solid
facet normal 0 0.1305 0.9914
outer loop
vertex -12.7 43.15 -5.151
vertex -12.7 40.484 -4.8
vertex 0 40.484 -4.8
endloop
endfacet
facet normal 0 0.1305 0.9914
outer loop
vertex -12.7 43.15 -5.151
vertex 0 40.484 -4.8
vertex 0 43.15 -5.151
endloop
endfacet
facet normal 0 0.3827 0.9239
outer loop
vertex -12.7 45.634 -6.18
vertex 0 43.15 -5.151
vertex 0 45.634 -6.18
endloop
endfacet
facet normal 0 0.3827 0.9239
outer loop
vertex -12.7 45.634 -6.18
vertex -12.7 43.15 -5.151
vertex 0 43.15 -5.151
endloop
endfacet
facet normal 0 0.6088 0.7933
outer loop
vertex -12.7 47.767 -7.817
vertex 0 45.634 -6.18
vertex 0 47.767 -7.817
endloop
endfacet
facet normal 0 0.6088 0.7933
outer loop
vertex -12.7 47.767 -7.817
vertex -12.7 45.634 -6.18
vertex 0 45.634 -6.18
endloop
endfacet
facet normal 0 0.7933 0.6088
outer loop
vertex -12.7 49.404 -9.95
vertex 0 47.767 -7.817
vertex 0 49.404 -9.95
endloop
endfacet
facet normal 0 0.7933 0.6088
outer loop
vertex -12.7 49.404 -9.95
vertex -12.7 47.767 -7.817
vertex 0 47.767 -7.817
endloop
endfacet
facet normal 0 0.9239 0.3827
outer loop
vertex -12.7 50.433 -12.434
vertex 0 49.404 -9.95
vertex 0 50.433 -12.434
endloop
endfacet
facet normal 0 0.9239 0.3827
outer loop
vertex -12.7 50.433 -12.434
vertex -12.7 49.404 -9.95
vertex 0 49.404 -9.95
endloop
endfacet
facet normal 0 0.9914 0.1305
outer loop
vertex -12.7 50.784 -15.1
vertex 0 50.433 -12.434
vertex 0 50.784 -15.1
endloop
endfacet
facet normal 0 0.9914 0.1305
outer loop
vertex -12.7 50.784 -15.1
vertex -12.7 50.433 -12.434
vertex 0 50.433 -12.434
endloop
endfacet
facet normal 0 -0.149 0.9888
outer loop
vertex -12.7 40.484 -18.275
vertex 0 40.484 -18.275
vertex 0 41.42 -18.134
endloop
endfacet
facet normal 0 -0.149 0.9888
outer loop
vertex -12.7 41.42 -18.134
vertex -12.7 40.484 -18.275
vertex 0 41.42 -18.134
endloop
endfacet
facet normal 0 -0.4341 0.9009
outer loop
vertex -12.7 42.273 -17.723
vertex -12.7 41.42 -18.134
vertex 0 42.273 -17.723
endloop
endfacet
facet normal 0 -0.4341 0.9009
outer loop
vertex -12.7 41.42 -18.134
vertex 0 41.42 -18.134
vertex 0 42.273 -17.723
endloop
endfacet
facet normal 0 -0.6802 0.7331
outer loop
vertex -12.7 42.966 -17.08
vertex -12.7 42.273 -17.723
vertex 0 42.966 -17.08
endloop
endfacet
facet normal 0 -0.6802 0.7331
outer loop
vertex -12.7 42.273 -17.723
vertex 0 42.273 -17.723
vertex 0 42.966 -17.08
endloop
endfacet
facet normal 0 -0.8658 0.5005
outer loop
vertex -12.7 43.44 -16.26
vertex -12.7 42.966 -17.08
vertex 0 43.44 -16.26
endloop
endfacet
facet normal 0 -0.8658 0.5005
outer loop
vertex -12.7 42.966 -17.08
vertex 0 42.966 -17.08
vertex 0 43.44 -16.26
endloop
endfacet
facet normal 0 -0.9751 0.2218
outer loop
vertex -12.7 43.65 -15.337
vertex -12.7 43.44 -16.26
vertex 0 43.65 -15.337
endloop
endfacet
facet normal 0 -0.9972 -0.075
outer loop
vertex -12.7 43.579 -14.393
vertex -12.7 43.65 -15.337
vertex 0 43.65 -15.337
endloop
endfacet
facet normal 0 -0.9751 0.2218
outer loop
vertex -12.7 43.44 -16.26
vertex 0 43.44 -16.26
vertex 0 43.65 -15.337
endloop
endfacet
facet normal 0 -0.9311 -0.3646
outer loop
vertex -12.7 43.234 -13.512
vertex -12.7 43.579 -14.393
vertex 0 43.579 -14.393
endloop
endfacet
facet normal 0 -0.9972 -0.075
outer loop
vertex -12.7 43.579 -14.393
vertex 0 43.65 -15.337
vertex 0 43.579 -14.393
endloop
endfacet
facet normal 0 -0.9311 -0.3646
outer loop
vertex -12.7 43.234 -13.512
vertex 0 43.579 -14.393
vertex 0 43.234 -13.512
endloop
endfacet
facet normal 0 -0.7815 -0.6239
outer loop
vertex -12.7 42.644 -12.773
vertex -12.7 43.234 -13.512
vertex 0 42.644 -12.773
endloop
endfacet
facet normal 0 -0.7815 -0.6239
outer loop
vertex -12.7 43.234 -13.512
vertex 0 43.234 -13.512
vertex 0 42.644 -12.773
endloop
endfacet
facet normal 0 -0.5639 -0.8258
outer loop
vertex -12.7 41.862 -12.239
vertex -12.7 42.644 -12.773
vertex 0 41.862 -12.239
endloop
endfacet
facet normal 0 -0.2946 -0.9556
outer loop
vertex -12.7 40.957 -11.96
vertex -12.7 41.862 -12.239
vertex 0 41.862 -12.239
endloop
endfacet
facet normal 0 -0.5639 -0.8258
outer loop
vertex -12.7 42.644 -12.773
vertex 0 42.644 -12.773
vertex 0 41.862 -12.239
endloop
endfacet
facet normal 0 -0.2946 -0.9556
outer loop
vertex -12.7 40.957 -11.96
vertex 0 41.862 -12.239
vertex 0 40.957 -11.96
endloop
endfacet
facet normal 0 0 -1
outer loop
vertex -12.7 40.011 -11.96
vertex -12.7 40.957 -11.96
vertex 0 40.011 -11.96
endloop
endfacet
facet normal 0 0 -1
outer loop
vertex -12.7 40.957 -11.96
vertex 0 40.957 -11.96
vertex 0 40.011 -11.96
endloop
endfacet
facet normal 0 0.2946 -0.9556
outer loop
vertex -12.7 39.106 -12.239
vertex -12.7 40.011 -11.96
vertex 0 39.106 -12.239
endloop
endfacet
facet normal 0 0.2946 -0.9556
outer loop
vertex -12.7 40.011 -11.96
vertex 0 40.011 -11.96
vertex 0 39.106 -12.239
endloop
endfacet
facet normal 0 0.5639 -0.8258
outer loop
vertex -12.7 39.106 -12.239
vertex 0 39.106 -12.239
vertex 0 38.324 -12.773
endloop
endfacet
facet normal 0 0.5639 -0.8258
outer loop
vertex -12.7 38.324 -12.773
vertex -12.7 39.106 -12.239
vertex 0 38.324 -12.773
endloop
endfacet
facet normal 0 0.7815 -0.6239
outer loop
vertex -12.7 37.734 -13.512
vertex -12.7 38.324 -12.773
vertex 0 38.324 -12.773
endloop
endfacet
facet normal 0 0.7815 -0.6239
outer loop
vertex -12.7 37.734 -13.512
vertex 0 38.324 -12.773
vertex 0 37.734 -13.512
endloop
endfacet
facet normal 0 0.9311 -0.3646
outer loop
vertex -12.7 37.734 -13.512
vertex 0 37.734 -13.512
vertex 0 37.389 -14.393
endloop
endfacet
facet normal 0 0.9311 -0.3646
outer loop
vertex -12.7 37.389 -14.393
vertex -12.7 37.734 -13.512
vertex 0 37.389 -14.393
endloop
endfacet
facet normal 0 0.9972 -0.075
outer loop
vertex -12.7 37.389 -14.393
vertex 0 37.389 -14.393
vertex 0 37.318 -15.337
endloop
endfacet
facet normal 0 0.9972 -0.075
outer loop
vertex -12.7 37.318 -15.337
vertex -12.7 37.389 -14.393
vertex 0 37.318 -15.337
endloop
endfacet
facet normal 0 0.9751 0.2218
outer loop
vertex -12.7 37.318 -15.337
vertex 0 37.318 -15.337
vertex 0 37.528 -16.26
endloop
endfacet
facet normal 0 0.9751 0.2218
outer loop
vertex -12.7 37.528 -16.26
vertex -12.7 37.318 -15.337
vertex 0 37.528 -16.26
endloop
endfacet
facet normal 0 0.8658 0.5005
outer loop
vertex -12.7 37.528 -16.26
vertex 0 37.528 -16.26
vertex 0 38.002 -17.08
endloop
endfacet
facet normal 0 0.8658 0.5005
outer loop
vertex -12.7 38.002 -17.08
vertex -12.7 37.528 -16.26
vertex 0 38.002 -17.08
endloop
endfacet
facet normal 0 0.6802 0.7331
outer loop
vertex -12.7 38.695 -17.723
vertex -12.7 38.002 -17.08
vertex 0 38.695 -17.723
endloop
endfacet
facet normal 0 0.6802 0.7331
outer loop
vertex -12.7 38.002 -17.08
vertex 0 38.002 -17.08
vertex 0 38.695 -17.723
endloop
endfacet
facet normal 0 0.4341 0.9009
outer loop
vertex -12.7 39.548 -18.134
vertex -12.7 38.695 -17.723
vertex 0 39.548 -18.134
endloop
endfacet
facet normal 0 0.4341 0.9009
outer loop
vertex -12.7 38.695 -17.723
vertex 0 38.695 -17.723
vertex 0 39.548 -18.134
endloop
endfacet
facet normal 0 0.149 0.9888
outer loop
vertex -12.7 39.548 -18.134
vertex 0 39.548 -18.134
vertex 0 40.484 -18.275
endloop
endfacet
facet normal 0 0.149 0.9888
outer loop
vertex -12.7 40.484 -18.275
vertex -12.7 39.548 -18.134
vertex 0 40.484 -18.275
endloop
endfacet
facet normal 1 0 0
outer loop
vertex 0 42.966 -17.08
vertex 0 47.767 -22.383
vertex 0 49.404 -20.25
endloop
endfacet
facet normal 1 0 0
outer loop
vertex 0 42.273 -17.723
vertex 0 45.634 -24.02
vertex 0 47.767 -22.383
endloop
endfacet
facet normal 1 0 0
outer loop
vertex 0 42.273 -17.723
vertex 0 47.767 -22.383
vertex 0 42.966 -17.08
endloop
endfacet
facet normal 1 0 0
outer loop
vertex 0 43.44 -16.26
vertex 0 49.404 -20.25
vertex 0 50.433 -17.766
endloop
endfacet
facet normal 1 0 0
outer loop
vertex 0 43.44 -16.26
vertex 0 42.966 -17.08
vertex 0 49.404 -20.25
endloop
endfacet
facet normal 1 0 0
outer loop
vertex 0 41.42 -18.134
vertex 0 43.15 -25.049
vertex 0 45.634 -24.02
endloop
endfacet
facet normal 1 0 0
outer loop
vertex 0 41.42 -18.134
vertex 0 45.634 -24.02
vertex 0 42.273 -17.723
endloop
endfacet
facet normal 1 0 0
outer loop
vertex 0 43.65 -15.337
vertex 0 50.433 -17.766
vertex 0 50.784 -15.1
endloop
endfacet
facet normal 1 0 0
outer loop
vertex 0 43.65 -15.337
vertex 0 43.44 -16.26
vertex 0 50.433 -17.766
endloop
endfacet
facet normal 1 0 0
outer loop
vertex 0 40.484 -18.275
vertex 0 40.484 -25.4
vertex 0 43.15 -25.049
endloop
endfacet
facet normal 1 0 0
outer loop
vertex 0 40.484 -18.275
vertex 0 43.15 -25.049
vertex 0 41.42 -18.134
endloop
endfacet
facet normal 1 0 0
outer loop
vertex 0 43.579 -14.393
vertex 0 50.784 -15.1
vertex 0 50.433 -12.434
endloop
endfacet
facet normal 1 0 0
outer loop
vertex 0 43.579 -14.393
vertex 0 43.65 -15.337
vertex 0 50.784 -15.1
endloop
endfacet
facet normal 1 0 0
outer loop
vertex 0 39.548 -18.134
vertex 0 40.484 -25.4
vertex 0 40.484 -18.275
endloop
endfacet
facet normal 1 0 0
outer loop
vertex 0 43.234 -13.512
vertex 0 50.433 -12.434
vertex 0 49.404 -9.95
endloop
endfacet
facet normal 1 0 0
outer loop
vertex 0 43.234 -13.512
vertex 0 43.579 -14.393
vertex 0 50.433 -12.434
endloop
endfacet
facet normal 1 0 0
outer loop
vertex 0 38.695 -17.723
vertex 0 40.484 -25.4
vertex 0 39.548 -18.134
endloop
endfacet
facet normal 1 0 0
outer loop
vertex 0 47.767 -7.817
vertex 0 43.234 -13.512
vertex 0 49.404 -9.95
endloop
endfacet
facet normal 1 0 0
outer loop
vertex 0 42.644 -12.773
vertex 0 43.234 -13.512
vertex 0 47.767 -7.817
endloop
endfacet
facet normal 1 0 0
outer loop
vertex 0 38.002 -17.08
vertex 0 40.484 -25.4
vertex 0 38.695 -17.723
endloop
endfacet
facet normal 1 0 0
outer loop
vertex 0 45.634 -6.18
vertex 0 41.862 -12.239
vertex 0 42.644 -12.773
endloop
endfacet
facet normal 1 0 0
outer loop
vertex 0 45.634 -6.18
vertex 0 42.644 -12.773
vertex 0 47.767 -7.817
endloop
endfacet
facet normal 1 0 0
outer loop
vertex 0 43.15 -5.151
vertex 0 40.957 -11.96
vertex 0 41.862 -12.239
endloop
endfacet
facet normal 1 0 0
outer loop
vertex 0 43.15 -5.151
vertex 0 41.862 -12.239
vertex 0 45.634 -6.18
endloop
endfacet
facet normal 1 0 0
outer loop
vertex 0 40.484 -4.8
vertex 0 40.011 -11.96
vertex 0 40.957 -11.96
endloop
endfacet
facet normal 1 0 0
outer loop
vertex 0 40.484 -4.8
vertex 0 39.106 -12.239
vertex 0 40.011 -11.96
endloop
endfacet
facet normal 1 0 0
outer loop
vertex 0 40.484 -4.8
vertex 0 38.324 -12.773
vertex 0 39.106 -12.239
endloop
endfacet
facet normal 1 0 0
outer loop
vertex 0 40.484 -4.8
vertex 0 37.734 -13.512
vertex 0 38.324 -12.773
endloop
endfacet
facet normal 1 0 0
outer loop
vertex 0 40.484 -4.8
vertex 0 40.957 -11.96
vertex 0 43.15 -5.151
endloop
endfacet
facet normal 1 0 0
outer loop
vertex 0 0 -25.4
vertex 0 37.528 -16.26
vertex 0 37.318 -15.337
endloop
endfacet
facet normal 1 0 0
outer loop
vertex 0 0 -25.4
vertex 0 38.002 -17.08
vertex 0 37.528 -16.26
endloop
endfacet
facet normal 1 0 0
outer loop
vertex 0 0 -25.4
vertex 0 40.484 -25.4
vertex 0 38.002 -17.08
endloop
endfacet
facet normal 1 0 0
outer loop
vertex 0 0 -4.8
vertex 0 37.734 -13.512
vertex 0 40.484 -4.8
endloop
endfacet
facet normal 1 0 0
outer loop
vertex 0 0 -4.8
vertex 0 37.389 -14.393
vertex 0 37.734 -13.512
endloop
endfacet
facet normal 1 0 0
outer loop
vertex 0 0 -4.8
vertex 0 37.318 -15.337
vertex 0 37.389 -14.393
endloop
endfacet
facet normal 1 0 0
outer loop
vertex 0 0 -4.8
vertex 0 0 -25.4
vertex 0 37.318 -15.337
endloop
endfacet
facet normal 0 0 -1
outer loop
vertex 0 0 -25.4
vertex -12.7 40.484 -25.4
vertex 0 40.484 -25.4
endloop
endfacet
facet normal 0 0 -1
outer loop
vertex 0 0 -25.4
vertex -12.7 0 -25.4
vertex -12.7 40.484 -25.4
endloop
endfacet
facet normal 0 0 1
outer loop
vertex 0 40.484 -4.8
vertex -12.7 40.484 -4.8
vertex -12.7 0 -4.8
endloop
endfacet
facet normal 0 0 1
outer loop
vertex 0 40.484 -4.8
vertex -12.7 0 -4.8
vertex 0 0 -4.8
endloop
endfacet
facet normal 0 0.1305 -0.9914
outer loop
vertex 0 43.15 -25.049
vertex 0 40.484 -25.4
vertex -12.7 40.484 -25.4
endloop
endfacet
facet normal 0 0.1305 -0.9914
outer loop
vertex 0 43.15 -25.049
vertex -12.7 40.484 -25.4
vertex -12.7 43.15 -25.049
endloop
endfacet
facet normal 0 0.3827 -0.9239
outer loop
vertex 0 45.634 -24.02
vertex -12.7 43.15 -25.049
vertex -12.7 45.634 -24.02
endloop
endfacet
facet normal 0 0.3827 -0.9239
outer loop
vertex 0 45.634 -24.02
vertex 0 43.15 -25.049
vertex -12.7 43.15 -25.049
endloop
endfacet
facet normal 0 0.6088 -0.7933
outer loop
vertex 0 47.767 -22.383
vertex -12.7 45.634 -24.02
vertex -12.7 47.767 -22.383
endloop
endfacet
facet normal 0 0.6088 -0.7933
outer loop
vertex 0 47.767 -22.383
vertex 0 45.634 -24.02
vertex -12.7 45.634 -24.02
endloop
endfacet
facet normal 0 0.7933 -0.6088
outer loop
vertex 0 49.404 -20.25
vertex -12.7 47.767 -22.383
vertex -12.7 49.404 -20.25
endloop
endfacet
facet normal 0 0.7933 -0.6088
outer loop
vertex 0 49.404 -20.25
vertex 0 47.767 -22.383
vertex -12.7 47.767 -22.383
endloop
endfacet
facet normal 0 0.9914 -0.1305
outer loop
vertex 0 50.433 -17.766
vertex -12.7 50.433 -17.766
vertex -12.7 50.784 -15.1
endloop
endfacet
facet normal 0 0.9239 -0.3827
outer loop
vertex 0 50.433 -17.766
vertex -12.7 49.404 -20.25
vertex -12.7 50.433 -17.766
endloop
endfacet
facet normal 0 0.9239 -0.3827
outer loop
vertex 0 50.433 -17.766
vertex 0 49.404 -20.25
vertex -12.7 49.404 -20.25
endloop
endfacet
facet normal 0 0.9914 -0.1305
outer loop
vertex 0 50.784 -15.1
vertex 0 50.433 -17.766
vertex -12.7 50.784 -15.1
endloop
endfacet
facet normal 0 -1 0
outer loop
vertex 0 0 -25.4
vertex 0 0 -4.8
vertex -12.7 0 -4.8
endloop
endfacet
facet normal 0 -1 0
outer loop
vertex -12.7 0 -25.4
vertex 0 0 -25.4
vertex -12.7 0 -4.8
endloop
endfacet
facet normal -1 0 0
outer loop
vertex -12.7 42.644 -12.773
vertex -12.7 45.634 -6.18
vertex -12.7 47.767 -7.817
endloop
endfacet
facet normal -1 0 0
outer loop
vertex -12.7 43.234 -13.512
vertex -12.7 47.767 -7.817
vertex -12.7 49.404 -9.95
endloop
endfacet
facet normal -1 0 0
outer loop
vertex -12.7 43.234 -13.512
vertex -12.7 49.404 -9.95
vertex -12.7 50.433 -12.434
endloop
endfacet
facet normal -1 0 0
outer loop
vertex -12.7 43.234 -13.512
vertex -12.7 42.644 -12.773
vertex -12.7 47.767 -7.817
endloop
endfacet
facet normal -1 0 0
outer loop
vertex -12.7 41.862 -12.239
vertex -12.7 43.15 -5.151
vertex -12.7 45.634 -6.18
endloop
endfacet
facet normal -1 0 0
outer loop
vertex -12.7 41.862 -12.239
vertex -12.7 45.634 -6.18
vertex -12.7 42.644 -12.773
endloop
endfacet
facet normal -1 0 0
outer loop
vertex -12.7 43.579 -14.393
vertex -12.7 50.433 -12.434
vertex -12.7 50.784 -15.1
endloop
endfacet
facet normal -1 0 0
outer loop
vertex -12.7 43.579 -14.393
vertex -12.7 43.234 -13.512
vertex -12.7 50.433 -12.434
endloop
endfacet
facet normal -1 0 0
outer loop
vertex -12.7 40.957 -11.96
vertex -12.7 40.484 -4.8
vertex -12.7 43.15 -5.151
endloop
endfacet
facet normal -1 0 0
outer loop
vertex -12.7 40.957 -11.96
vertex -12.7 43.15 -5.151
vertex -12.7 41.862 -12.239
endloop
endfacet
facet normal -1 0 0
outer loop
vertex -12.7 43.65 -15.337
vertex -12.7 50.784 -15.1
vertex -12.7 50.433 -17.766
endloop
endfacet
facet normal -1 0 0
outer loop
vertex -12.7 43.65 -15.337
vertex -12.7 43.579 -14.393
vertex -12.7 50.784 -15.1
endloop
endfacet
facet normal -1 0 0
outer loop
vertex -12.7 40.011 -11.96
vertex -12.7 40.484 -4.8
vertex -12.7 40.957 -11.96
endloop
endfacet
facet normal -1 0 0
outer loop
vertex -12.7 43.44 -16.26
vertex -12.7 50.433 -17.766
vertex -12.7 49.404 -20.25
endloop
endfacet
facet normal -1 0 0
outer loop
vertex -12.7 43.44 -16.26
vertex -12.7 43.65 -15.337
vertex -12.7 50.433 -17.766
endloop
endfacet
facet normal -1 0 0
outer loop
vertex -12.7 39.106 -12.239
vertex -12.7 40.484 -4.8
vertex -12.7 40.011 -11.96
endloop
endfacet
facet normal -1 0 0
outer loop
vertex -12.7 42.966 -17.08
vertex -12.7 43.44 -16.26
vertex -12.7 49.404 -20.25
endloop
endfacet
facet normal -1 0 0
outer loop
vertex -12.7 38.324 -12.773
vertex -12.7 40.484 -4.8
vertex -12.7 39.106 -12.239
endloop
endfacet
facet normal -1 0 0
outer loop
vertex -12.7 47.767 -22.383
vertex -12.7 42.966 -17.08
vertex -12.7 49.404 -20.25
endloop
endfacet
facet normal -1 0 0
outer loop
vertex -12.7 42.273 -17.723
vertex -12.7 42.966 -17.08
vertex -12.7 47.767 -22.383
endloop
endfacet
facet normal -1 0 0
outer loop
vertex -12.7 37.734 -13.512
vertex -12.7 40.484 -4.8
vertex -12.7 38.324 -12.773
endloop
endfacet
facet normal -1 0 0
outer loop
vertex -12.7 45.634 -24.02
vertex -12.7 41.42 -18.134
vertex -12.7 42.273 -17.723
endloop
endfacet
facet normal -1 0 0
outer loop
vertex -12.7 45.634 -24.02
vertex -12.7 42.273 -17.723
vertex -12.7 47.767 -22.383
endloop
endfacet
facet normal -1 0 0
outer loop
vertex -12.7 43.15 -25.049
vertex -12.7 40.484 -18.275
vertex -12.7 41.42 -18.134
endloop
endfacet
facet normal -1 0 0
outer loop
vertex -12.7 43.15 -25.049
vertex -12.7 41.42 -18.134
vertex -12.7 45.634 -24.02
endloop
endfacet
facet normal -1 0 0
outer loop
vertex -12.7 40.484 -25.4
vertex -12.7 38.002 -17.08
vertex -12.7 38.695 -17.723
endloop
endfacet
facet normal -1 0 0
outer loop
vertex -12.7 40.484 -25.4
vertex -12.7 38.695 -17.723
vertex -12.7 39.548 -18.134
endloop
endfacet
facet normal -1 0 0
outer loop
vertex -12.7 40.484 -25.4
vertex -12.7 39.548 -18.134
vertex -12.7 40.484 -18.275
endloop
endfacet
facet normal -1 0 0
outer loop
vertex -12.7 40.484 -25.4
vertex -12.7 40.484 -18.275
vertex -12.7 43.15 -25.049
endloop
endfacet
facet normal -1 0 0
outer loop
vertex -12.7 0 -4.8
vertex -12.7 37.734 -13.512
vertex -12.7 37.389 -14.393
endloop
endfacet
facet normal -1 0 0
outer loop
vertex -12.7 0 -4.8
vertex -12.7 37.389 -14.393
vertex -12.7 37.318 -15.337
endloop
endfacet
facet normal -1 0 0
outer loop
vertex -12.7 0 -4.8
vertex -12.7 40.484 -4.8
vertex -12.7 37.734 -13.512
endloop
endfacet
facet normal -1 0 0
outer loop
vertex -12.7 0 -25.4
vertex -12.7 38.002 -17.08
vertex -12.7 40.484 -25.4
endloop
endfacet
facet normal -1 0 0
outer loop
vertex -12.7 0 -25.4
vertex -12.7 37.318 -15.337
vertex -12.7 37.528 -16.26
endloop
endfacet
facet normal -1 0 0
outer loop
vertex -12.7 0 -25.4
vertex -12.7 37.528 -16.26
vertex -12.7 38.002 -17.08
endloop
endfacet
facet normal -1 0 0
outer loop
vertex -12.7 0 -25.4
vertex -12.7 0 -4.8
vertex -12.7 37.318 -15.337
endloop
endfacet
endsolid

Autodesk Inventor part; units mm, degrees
ref_plane "YZ Plane" through (0, 0, 0) normal (1, 0, 0) x (0, 1, 0)
ref_plane "XZ Plane" through (0, 0, 0) normal (0, 1, 0) x (-1, 0, 0)
ref_plane "XY Plane" through (0, 0, 0) normal (0, 0, 1) x (1, 0, 0)
sketch "Sketch1" plane through (0, 0, 0) normal (0, 1, 0) x (-1, 0, 0)
  line L0 (0, 0) -> (12.7, 0)
  line L1 (12.7, 0) -> (12.7, -25.4)
  line L2 (12.7, -25.4) -> (0, -25.4)
  line L3 (0, -25.4) -> (0, 0)
  dimension "d1" = 25.4
  dimension "d2" = 12.7
extrude "Extrusion1" add sketch "Sketch1" along normal blind 45
sketch "Sketch7" plane through (0, 45, 0) normal (0, 1, 0) x (1, 0, 0)
  line L0 (-12.7, 0) -> (0, 0) projected
  line L1 (-12.7, 25.4) -> (-12.7, 0) projected
  line L2 (0, 0) -> (-12.7, 0)
  line L3 (-12.7, 0) -> (-12.7, 25.4)
  line L4 (-12.7, 25.4) -> (0, 25.4)
  line L5 (0, 25.4) -> (0, 0)
extrude "Extrusion6" add sketch "Sketch7" along normal blind 15
sketch "Sketch12" plane through (0, 60, 0) normal (0, 1, 0) x (1, 0, 0)
  line L0 (0, 0) -> (0, 25.4) projected
  line L1 (-12.7, 25.4) -> (-12.7, 0) projected
  line L2 (0, 4.8) -> (-12.7, 4.8)
  line L3 (-12.7, 4.8) -> (-12.7, 25.4)
  line L4 (-12.7, 25.4) -> (0, 25.4)
  line L5 (0, 25.4) -> (0, 4.8)
  point P0 (-12.7, 4.8)
  point P1 (-12.7, 4.8)
extrude "Extrusion11" cut sketch "Sketch12" against normal blind 9.216
fillet "Fillet5" radius 10.3 1 edges at (-6.35, 50.784, -25.4)
sketch "Sketch14" plane through (-12.7, 0, 0) normal (0, 0, 1) x (1, 0, 0)
  line L0 (0, 60) -> (12.7, 60) projected
  line L1 (12.7, 0) -> (12.7, 40.484) projected
  line L2 (0, 60) -> (12.7, 60)
  line L3 (12.7, 60) -> (12.7, 0)
  line L4 (12.7, 0) -> (0, 0)
  line L5 (0, 0) -> (0, 60)
extrude "Extrusion13" cut sketch "Sketch14" against normal blind 4.8
fillet "Fillet6" radius 10.3 1 edges at (-6.35, 50.784, -4.8)
sketch "Sketch18" plane through (0, 0, -25.4) normal (1, 0, 0) x (0, 0, -1)
  arc A0 (0, 40.484) -> (-20.6, 40.484) centre (-10.3, 40.484) ccw projected
  circle A1 centre (-10.3, 40.484) radius 3.175
  point P0 (-25.4, 0)
  dimension "d65" = 6.35
extrude "Extrusion17" cut sketch "Sketch18" against normal through all
properties part number "gear support"
